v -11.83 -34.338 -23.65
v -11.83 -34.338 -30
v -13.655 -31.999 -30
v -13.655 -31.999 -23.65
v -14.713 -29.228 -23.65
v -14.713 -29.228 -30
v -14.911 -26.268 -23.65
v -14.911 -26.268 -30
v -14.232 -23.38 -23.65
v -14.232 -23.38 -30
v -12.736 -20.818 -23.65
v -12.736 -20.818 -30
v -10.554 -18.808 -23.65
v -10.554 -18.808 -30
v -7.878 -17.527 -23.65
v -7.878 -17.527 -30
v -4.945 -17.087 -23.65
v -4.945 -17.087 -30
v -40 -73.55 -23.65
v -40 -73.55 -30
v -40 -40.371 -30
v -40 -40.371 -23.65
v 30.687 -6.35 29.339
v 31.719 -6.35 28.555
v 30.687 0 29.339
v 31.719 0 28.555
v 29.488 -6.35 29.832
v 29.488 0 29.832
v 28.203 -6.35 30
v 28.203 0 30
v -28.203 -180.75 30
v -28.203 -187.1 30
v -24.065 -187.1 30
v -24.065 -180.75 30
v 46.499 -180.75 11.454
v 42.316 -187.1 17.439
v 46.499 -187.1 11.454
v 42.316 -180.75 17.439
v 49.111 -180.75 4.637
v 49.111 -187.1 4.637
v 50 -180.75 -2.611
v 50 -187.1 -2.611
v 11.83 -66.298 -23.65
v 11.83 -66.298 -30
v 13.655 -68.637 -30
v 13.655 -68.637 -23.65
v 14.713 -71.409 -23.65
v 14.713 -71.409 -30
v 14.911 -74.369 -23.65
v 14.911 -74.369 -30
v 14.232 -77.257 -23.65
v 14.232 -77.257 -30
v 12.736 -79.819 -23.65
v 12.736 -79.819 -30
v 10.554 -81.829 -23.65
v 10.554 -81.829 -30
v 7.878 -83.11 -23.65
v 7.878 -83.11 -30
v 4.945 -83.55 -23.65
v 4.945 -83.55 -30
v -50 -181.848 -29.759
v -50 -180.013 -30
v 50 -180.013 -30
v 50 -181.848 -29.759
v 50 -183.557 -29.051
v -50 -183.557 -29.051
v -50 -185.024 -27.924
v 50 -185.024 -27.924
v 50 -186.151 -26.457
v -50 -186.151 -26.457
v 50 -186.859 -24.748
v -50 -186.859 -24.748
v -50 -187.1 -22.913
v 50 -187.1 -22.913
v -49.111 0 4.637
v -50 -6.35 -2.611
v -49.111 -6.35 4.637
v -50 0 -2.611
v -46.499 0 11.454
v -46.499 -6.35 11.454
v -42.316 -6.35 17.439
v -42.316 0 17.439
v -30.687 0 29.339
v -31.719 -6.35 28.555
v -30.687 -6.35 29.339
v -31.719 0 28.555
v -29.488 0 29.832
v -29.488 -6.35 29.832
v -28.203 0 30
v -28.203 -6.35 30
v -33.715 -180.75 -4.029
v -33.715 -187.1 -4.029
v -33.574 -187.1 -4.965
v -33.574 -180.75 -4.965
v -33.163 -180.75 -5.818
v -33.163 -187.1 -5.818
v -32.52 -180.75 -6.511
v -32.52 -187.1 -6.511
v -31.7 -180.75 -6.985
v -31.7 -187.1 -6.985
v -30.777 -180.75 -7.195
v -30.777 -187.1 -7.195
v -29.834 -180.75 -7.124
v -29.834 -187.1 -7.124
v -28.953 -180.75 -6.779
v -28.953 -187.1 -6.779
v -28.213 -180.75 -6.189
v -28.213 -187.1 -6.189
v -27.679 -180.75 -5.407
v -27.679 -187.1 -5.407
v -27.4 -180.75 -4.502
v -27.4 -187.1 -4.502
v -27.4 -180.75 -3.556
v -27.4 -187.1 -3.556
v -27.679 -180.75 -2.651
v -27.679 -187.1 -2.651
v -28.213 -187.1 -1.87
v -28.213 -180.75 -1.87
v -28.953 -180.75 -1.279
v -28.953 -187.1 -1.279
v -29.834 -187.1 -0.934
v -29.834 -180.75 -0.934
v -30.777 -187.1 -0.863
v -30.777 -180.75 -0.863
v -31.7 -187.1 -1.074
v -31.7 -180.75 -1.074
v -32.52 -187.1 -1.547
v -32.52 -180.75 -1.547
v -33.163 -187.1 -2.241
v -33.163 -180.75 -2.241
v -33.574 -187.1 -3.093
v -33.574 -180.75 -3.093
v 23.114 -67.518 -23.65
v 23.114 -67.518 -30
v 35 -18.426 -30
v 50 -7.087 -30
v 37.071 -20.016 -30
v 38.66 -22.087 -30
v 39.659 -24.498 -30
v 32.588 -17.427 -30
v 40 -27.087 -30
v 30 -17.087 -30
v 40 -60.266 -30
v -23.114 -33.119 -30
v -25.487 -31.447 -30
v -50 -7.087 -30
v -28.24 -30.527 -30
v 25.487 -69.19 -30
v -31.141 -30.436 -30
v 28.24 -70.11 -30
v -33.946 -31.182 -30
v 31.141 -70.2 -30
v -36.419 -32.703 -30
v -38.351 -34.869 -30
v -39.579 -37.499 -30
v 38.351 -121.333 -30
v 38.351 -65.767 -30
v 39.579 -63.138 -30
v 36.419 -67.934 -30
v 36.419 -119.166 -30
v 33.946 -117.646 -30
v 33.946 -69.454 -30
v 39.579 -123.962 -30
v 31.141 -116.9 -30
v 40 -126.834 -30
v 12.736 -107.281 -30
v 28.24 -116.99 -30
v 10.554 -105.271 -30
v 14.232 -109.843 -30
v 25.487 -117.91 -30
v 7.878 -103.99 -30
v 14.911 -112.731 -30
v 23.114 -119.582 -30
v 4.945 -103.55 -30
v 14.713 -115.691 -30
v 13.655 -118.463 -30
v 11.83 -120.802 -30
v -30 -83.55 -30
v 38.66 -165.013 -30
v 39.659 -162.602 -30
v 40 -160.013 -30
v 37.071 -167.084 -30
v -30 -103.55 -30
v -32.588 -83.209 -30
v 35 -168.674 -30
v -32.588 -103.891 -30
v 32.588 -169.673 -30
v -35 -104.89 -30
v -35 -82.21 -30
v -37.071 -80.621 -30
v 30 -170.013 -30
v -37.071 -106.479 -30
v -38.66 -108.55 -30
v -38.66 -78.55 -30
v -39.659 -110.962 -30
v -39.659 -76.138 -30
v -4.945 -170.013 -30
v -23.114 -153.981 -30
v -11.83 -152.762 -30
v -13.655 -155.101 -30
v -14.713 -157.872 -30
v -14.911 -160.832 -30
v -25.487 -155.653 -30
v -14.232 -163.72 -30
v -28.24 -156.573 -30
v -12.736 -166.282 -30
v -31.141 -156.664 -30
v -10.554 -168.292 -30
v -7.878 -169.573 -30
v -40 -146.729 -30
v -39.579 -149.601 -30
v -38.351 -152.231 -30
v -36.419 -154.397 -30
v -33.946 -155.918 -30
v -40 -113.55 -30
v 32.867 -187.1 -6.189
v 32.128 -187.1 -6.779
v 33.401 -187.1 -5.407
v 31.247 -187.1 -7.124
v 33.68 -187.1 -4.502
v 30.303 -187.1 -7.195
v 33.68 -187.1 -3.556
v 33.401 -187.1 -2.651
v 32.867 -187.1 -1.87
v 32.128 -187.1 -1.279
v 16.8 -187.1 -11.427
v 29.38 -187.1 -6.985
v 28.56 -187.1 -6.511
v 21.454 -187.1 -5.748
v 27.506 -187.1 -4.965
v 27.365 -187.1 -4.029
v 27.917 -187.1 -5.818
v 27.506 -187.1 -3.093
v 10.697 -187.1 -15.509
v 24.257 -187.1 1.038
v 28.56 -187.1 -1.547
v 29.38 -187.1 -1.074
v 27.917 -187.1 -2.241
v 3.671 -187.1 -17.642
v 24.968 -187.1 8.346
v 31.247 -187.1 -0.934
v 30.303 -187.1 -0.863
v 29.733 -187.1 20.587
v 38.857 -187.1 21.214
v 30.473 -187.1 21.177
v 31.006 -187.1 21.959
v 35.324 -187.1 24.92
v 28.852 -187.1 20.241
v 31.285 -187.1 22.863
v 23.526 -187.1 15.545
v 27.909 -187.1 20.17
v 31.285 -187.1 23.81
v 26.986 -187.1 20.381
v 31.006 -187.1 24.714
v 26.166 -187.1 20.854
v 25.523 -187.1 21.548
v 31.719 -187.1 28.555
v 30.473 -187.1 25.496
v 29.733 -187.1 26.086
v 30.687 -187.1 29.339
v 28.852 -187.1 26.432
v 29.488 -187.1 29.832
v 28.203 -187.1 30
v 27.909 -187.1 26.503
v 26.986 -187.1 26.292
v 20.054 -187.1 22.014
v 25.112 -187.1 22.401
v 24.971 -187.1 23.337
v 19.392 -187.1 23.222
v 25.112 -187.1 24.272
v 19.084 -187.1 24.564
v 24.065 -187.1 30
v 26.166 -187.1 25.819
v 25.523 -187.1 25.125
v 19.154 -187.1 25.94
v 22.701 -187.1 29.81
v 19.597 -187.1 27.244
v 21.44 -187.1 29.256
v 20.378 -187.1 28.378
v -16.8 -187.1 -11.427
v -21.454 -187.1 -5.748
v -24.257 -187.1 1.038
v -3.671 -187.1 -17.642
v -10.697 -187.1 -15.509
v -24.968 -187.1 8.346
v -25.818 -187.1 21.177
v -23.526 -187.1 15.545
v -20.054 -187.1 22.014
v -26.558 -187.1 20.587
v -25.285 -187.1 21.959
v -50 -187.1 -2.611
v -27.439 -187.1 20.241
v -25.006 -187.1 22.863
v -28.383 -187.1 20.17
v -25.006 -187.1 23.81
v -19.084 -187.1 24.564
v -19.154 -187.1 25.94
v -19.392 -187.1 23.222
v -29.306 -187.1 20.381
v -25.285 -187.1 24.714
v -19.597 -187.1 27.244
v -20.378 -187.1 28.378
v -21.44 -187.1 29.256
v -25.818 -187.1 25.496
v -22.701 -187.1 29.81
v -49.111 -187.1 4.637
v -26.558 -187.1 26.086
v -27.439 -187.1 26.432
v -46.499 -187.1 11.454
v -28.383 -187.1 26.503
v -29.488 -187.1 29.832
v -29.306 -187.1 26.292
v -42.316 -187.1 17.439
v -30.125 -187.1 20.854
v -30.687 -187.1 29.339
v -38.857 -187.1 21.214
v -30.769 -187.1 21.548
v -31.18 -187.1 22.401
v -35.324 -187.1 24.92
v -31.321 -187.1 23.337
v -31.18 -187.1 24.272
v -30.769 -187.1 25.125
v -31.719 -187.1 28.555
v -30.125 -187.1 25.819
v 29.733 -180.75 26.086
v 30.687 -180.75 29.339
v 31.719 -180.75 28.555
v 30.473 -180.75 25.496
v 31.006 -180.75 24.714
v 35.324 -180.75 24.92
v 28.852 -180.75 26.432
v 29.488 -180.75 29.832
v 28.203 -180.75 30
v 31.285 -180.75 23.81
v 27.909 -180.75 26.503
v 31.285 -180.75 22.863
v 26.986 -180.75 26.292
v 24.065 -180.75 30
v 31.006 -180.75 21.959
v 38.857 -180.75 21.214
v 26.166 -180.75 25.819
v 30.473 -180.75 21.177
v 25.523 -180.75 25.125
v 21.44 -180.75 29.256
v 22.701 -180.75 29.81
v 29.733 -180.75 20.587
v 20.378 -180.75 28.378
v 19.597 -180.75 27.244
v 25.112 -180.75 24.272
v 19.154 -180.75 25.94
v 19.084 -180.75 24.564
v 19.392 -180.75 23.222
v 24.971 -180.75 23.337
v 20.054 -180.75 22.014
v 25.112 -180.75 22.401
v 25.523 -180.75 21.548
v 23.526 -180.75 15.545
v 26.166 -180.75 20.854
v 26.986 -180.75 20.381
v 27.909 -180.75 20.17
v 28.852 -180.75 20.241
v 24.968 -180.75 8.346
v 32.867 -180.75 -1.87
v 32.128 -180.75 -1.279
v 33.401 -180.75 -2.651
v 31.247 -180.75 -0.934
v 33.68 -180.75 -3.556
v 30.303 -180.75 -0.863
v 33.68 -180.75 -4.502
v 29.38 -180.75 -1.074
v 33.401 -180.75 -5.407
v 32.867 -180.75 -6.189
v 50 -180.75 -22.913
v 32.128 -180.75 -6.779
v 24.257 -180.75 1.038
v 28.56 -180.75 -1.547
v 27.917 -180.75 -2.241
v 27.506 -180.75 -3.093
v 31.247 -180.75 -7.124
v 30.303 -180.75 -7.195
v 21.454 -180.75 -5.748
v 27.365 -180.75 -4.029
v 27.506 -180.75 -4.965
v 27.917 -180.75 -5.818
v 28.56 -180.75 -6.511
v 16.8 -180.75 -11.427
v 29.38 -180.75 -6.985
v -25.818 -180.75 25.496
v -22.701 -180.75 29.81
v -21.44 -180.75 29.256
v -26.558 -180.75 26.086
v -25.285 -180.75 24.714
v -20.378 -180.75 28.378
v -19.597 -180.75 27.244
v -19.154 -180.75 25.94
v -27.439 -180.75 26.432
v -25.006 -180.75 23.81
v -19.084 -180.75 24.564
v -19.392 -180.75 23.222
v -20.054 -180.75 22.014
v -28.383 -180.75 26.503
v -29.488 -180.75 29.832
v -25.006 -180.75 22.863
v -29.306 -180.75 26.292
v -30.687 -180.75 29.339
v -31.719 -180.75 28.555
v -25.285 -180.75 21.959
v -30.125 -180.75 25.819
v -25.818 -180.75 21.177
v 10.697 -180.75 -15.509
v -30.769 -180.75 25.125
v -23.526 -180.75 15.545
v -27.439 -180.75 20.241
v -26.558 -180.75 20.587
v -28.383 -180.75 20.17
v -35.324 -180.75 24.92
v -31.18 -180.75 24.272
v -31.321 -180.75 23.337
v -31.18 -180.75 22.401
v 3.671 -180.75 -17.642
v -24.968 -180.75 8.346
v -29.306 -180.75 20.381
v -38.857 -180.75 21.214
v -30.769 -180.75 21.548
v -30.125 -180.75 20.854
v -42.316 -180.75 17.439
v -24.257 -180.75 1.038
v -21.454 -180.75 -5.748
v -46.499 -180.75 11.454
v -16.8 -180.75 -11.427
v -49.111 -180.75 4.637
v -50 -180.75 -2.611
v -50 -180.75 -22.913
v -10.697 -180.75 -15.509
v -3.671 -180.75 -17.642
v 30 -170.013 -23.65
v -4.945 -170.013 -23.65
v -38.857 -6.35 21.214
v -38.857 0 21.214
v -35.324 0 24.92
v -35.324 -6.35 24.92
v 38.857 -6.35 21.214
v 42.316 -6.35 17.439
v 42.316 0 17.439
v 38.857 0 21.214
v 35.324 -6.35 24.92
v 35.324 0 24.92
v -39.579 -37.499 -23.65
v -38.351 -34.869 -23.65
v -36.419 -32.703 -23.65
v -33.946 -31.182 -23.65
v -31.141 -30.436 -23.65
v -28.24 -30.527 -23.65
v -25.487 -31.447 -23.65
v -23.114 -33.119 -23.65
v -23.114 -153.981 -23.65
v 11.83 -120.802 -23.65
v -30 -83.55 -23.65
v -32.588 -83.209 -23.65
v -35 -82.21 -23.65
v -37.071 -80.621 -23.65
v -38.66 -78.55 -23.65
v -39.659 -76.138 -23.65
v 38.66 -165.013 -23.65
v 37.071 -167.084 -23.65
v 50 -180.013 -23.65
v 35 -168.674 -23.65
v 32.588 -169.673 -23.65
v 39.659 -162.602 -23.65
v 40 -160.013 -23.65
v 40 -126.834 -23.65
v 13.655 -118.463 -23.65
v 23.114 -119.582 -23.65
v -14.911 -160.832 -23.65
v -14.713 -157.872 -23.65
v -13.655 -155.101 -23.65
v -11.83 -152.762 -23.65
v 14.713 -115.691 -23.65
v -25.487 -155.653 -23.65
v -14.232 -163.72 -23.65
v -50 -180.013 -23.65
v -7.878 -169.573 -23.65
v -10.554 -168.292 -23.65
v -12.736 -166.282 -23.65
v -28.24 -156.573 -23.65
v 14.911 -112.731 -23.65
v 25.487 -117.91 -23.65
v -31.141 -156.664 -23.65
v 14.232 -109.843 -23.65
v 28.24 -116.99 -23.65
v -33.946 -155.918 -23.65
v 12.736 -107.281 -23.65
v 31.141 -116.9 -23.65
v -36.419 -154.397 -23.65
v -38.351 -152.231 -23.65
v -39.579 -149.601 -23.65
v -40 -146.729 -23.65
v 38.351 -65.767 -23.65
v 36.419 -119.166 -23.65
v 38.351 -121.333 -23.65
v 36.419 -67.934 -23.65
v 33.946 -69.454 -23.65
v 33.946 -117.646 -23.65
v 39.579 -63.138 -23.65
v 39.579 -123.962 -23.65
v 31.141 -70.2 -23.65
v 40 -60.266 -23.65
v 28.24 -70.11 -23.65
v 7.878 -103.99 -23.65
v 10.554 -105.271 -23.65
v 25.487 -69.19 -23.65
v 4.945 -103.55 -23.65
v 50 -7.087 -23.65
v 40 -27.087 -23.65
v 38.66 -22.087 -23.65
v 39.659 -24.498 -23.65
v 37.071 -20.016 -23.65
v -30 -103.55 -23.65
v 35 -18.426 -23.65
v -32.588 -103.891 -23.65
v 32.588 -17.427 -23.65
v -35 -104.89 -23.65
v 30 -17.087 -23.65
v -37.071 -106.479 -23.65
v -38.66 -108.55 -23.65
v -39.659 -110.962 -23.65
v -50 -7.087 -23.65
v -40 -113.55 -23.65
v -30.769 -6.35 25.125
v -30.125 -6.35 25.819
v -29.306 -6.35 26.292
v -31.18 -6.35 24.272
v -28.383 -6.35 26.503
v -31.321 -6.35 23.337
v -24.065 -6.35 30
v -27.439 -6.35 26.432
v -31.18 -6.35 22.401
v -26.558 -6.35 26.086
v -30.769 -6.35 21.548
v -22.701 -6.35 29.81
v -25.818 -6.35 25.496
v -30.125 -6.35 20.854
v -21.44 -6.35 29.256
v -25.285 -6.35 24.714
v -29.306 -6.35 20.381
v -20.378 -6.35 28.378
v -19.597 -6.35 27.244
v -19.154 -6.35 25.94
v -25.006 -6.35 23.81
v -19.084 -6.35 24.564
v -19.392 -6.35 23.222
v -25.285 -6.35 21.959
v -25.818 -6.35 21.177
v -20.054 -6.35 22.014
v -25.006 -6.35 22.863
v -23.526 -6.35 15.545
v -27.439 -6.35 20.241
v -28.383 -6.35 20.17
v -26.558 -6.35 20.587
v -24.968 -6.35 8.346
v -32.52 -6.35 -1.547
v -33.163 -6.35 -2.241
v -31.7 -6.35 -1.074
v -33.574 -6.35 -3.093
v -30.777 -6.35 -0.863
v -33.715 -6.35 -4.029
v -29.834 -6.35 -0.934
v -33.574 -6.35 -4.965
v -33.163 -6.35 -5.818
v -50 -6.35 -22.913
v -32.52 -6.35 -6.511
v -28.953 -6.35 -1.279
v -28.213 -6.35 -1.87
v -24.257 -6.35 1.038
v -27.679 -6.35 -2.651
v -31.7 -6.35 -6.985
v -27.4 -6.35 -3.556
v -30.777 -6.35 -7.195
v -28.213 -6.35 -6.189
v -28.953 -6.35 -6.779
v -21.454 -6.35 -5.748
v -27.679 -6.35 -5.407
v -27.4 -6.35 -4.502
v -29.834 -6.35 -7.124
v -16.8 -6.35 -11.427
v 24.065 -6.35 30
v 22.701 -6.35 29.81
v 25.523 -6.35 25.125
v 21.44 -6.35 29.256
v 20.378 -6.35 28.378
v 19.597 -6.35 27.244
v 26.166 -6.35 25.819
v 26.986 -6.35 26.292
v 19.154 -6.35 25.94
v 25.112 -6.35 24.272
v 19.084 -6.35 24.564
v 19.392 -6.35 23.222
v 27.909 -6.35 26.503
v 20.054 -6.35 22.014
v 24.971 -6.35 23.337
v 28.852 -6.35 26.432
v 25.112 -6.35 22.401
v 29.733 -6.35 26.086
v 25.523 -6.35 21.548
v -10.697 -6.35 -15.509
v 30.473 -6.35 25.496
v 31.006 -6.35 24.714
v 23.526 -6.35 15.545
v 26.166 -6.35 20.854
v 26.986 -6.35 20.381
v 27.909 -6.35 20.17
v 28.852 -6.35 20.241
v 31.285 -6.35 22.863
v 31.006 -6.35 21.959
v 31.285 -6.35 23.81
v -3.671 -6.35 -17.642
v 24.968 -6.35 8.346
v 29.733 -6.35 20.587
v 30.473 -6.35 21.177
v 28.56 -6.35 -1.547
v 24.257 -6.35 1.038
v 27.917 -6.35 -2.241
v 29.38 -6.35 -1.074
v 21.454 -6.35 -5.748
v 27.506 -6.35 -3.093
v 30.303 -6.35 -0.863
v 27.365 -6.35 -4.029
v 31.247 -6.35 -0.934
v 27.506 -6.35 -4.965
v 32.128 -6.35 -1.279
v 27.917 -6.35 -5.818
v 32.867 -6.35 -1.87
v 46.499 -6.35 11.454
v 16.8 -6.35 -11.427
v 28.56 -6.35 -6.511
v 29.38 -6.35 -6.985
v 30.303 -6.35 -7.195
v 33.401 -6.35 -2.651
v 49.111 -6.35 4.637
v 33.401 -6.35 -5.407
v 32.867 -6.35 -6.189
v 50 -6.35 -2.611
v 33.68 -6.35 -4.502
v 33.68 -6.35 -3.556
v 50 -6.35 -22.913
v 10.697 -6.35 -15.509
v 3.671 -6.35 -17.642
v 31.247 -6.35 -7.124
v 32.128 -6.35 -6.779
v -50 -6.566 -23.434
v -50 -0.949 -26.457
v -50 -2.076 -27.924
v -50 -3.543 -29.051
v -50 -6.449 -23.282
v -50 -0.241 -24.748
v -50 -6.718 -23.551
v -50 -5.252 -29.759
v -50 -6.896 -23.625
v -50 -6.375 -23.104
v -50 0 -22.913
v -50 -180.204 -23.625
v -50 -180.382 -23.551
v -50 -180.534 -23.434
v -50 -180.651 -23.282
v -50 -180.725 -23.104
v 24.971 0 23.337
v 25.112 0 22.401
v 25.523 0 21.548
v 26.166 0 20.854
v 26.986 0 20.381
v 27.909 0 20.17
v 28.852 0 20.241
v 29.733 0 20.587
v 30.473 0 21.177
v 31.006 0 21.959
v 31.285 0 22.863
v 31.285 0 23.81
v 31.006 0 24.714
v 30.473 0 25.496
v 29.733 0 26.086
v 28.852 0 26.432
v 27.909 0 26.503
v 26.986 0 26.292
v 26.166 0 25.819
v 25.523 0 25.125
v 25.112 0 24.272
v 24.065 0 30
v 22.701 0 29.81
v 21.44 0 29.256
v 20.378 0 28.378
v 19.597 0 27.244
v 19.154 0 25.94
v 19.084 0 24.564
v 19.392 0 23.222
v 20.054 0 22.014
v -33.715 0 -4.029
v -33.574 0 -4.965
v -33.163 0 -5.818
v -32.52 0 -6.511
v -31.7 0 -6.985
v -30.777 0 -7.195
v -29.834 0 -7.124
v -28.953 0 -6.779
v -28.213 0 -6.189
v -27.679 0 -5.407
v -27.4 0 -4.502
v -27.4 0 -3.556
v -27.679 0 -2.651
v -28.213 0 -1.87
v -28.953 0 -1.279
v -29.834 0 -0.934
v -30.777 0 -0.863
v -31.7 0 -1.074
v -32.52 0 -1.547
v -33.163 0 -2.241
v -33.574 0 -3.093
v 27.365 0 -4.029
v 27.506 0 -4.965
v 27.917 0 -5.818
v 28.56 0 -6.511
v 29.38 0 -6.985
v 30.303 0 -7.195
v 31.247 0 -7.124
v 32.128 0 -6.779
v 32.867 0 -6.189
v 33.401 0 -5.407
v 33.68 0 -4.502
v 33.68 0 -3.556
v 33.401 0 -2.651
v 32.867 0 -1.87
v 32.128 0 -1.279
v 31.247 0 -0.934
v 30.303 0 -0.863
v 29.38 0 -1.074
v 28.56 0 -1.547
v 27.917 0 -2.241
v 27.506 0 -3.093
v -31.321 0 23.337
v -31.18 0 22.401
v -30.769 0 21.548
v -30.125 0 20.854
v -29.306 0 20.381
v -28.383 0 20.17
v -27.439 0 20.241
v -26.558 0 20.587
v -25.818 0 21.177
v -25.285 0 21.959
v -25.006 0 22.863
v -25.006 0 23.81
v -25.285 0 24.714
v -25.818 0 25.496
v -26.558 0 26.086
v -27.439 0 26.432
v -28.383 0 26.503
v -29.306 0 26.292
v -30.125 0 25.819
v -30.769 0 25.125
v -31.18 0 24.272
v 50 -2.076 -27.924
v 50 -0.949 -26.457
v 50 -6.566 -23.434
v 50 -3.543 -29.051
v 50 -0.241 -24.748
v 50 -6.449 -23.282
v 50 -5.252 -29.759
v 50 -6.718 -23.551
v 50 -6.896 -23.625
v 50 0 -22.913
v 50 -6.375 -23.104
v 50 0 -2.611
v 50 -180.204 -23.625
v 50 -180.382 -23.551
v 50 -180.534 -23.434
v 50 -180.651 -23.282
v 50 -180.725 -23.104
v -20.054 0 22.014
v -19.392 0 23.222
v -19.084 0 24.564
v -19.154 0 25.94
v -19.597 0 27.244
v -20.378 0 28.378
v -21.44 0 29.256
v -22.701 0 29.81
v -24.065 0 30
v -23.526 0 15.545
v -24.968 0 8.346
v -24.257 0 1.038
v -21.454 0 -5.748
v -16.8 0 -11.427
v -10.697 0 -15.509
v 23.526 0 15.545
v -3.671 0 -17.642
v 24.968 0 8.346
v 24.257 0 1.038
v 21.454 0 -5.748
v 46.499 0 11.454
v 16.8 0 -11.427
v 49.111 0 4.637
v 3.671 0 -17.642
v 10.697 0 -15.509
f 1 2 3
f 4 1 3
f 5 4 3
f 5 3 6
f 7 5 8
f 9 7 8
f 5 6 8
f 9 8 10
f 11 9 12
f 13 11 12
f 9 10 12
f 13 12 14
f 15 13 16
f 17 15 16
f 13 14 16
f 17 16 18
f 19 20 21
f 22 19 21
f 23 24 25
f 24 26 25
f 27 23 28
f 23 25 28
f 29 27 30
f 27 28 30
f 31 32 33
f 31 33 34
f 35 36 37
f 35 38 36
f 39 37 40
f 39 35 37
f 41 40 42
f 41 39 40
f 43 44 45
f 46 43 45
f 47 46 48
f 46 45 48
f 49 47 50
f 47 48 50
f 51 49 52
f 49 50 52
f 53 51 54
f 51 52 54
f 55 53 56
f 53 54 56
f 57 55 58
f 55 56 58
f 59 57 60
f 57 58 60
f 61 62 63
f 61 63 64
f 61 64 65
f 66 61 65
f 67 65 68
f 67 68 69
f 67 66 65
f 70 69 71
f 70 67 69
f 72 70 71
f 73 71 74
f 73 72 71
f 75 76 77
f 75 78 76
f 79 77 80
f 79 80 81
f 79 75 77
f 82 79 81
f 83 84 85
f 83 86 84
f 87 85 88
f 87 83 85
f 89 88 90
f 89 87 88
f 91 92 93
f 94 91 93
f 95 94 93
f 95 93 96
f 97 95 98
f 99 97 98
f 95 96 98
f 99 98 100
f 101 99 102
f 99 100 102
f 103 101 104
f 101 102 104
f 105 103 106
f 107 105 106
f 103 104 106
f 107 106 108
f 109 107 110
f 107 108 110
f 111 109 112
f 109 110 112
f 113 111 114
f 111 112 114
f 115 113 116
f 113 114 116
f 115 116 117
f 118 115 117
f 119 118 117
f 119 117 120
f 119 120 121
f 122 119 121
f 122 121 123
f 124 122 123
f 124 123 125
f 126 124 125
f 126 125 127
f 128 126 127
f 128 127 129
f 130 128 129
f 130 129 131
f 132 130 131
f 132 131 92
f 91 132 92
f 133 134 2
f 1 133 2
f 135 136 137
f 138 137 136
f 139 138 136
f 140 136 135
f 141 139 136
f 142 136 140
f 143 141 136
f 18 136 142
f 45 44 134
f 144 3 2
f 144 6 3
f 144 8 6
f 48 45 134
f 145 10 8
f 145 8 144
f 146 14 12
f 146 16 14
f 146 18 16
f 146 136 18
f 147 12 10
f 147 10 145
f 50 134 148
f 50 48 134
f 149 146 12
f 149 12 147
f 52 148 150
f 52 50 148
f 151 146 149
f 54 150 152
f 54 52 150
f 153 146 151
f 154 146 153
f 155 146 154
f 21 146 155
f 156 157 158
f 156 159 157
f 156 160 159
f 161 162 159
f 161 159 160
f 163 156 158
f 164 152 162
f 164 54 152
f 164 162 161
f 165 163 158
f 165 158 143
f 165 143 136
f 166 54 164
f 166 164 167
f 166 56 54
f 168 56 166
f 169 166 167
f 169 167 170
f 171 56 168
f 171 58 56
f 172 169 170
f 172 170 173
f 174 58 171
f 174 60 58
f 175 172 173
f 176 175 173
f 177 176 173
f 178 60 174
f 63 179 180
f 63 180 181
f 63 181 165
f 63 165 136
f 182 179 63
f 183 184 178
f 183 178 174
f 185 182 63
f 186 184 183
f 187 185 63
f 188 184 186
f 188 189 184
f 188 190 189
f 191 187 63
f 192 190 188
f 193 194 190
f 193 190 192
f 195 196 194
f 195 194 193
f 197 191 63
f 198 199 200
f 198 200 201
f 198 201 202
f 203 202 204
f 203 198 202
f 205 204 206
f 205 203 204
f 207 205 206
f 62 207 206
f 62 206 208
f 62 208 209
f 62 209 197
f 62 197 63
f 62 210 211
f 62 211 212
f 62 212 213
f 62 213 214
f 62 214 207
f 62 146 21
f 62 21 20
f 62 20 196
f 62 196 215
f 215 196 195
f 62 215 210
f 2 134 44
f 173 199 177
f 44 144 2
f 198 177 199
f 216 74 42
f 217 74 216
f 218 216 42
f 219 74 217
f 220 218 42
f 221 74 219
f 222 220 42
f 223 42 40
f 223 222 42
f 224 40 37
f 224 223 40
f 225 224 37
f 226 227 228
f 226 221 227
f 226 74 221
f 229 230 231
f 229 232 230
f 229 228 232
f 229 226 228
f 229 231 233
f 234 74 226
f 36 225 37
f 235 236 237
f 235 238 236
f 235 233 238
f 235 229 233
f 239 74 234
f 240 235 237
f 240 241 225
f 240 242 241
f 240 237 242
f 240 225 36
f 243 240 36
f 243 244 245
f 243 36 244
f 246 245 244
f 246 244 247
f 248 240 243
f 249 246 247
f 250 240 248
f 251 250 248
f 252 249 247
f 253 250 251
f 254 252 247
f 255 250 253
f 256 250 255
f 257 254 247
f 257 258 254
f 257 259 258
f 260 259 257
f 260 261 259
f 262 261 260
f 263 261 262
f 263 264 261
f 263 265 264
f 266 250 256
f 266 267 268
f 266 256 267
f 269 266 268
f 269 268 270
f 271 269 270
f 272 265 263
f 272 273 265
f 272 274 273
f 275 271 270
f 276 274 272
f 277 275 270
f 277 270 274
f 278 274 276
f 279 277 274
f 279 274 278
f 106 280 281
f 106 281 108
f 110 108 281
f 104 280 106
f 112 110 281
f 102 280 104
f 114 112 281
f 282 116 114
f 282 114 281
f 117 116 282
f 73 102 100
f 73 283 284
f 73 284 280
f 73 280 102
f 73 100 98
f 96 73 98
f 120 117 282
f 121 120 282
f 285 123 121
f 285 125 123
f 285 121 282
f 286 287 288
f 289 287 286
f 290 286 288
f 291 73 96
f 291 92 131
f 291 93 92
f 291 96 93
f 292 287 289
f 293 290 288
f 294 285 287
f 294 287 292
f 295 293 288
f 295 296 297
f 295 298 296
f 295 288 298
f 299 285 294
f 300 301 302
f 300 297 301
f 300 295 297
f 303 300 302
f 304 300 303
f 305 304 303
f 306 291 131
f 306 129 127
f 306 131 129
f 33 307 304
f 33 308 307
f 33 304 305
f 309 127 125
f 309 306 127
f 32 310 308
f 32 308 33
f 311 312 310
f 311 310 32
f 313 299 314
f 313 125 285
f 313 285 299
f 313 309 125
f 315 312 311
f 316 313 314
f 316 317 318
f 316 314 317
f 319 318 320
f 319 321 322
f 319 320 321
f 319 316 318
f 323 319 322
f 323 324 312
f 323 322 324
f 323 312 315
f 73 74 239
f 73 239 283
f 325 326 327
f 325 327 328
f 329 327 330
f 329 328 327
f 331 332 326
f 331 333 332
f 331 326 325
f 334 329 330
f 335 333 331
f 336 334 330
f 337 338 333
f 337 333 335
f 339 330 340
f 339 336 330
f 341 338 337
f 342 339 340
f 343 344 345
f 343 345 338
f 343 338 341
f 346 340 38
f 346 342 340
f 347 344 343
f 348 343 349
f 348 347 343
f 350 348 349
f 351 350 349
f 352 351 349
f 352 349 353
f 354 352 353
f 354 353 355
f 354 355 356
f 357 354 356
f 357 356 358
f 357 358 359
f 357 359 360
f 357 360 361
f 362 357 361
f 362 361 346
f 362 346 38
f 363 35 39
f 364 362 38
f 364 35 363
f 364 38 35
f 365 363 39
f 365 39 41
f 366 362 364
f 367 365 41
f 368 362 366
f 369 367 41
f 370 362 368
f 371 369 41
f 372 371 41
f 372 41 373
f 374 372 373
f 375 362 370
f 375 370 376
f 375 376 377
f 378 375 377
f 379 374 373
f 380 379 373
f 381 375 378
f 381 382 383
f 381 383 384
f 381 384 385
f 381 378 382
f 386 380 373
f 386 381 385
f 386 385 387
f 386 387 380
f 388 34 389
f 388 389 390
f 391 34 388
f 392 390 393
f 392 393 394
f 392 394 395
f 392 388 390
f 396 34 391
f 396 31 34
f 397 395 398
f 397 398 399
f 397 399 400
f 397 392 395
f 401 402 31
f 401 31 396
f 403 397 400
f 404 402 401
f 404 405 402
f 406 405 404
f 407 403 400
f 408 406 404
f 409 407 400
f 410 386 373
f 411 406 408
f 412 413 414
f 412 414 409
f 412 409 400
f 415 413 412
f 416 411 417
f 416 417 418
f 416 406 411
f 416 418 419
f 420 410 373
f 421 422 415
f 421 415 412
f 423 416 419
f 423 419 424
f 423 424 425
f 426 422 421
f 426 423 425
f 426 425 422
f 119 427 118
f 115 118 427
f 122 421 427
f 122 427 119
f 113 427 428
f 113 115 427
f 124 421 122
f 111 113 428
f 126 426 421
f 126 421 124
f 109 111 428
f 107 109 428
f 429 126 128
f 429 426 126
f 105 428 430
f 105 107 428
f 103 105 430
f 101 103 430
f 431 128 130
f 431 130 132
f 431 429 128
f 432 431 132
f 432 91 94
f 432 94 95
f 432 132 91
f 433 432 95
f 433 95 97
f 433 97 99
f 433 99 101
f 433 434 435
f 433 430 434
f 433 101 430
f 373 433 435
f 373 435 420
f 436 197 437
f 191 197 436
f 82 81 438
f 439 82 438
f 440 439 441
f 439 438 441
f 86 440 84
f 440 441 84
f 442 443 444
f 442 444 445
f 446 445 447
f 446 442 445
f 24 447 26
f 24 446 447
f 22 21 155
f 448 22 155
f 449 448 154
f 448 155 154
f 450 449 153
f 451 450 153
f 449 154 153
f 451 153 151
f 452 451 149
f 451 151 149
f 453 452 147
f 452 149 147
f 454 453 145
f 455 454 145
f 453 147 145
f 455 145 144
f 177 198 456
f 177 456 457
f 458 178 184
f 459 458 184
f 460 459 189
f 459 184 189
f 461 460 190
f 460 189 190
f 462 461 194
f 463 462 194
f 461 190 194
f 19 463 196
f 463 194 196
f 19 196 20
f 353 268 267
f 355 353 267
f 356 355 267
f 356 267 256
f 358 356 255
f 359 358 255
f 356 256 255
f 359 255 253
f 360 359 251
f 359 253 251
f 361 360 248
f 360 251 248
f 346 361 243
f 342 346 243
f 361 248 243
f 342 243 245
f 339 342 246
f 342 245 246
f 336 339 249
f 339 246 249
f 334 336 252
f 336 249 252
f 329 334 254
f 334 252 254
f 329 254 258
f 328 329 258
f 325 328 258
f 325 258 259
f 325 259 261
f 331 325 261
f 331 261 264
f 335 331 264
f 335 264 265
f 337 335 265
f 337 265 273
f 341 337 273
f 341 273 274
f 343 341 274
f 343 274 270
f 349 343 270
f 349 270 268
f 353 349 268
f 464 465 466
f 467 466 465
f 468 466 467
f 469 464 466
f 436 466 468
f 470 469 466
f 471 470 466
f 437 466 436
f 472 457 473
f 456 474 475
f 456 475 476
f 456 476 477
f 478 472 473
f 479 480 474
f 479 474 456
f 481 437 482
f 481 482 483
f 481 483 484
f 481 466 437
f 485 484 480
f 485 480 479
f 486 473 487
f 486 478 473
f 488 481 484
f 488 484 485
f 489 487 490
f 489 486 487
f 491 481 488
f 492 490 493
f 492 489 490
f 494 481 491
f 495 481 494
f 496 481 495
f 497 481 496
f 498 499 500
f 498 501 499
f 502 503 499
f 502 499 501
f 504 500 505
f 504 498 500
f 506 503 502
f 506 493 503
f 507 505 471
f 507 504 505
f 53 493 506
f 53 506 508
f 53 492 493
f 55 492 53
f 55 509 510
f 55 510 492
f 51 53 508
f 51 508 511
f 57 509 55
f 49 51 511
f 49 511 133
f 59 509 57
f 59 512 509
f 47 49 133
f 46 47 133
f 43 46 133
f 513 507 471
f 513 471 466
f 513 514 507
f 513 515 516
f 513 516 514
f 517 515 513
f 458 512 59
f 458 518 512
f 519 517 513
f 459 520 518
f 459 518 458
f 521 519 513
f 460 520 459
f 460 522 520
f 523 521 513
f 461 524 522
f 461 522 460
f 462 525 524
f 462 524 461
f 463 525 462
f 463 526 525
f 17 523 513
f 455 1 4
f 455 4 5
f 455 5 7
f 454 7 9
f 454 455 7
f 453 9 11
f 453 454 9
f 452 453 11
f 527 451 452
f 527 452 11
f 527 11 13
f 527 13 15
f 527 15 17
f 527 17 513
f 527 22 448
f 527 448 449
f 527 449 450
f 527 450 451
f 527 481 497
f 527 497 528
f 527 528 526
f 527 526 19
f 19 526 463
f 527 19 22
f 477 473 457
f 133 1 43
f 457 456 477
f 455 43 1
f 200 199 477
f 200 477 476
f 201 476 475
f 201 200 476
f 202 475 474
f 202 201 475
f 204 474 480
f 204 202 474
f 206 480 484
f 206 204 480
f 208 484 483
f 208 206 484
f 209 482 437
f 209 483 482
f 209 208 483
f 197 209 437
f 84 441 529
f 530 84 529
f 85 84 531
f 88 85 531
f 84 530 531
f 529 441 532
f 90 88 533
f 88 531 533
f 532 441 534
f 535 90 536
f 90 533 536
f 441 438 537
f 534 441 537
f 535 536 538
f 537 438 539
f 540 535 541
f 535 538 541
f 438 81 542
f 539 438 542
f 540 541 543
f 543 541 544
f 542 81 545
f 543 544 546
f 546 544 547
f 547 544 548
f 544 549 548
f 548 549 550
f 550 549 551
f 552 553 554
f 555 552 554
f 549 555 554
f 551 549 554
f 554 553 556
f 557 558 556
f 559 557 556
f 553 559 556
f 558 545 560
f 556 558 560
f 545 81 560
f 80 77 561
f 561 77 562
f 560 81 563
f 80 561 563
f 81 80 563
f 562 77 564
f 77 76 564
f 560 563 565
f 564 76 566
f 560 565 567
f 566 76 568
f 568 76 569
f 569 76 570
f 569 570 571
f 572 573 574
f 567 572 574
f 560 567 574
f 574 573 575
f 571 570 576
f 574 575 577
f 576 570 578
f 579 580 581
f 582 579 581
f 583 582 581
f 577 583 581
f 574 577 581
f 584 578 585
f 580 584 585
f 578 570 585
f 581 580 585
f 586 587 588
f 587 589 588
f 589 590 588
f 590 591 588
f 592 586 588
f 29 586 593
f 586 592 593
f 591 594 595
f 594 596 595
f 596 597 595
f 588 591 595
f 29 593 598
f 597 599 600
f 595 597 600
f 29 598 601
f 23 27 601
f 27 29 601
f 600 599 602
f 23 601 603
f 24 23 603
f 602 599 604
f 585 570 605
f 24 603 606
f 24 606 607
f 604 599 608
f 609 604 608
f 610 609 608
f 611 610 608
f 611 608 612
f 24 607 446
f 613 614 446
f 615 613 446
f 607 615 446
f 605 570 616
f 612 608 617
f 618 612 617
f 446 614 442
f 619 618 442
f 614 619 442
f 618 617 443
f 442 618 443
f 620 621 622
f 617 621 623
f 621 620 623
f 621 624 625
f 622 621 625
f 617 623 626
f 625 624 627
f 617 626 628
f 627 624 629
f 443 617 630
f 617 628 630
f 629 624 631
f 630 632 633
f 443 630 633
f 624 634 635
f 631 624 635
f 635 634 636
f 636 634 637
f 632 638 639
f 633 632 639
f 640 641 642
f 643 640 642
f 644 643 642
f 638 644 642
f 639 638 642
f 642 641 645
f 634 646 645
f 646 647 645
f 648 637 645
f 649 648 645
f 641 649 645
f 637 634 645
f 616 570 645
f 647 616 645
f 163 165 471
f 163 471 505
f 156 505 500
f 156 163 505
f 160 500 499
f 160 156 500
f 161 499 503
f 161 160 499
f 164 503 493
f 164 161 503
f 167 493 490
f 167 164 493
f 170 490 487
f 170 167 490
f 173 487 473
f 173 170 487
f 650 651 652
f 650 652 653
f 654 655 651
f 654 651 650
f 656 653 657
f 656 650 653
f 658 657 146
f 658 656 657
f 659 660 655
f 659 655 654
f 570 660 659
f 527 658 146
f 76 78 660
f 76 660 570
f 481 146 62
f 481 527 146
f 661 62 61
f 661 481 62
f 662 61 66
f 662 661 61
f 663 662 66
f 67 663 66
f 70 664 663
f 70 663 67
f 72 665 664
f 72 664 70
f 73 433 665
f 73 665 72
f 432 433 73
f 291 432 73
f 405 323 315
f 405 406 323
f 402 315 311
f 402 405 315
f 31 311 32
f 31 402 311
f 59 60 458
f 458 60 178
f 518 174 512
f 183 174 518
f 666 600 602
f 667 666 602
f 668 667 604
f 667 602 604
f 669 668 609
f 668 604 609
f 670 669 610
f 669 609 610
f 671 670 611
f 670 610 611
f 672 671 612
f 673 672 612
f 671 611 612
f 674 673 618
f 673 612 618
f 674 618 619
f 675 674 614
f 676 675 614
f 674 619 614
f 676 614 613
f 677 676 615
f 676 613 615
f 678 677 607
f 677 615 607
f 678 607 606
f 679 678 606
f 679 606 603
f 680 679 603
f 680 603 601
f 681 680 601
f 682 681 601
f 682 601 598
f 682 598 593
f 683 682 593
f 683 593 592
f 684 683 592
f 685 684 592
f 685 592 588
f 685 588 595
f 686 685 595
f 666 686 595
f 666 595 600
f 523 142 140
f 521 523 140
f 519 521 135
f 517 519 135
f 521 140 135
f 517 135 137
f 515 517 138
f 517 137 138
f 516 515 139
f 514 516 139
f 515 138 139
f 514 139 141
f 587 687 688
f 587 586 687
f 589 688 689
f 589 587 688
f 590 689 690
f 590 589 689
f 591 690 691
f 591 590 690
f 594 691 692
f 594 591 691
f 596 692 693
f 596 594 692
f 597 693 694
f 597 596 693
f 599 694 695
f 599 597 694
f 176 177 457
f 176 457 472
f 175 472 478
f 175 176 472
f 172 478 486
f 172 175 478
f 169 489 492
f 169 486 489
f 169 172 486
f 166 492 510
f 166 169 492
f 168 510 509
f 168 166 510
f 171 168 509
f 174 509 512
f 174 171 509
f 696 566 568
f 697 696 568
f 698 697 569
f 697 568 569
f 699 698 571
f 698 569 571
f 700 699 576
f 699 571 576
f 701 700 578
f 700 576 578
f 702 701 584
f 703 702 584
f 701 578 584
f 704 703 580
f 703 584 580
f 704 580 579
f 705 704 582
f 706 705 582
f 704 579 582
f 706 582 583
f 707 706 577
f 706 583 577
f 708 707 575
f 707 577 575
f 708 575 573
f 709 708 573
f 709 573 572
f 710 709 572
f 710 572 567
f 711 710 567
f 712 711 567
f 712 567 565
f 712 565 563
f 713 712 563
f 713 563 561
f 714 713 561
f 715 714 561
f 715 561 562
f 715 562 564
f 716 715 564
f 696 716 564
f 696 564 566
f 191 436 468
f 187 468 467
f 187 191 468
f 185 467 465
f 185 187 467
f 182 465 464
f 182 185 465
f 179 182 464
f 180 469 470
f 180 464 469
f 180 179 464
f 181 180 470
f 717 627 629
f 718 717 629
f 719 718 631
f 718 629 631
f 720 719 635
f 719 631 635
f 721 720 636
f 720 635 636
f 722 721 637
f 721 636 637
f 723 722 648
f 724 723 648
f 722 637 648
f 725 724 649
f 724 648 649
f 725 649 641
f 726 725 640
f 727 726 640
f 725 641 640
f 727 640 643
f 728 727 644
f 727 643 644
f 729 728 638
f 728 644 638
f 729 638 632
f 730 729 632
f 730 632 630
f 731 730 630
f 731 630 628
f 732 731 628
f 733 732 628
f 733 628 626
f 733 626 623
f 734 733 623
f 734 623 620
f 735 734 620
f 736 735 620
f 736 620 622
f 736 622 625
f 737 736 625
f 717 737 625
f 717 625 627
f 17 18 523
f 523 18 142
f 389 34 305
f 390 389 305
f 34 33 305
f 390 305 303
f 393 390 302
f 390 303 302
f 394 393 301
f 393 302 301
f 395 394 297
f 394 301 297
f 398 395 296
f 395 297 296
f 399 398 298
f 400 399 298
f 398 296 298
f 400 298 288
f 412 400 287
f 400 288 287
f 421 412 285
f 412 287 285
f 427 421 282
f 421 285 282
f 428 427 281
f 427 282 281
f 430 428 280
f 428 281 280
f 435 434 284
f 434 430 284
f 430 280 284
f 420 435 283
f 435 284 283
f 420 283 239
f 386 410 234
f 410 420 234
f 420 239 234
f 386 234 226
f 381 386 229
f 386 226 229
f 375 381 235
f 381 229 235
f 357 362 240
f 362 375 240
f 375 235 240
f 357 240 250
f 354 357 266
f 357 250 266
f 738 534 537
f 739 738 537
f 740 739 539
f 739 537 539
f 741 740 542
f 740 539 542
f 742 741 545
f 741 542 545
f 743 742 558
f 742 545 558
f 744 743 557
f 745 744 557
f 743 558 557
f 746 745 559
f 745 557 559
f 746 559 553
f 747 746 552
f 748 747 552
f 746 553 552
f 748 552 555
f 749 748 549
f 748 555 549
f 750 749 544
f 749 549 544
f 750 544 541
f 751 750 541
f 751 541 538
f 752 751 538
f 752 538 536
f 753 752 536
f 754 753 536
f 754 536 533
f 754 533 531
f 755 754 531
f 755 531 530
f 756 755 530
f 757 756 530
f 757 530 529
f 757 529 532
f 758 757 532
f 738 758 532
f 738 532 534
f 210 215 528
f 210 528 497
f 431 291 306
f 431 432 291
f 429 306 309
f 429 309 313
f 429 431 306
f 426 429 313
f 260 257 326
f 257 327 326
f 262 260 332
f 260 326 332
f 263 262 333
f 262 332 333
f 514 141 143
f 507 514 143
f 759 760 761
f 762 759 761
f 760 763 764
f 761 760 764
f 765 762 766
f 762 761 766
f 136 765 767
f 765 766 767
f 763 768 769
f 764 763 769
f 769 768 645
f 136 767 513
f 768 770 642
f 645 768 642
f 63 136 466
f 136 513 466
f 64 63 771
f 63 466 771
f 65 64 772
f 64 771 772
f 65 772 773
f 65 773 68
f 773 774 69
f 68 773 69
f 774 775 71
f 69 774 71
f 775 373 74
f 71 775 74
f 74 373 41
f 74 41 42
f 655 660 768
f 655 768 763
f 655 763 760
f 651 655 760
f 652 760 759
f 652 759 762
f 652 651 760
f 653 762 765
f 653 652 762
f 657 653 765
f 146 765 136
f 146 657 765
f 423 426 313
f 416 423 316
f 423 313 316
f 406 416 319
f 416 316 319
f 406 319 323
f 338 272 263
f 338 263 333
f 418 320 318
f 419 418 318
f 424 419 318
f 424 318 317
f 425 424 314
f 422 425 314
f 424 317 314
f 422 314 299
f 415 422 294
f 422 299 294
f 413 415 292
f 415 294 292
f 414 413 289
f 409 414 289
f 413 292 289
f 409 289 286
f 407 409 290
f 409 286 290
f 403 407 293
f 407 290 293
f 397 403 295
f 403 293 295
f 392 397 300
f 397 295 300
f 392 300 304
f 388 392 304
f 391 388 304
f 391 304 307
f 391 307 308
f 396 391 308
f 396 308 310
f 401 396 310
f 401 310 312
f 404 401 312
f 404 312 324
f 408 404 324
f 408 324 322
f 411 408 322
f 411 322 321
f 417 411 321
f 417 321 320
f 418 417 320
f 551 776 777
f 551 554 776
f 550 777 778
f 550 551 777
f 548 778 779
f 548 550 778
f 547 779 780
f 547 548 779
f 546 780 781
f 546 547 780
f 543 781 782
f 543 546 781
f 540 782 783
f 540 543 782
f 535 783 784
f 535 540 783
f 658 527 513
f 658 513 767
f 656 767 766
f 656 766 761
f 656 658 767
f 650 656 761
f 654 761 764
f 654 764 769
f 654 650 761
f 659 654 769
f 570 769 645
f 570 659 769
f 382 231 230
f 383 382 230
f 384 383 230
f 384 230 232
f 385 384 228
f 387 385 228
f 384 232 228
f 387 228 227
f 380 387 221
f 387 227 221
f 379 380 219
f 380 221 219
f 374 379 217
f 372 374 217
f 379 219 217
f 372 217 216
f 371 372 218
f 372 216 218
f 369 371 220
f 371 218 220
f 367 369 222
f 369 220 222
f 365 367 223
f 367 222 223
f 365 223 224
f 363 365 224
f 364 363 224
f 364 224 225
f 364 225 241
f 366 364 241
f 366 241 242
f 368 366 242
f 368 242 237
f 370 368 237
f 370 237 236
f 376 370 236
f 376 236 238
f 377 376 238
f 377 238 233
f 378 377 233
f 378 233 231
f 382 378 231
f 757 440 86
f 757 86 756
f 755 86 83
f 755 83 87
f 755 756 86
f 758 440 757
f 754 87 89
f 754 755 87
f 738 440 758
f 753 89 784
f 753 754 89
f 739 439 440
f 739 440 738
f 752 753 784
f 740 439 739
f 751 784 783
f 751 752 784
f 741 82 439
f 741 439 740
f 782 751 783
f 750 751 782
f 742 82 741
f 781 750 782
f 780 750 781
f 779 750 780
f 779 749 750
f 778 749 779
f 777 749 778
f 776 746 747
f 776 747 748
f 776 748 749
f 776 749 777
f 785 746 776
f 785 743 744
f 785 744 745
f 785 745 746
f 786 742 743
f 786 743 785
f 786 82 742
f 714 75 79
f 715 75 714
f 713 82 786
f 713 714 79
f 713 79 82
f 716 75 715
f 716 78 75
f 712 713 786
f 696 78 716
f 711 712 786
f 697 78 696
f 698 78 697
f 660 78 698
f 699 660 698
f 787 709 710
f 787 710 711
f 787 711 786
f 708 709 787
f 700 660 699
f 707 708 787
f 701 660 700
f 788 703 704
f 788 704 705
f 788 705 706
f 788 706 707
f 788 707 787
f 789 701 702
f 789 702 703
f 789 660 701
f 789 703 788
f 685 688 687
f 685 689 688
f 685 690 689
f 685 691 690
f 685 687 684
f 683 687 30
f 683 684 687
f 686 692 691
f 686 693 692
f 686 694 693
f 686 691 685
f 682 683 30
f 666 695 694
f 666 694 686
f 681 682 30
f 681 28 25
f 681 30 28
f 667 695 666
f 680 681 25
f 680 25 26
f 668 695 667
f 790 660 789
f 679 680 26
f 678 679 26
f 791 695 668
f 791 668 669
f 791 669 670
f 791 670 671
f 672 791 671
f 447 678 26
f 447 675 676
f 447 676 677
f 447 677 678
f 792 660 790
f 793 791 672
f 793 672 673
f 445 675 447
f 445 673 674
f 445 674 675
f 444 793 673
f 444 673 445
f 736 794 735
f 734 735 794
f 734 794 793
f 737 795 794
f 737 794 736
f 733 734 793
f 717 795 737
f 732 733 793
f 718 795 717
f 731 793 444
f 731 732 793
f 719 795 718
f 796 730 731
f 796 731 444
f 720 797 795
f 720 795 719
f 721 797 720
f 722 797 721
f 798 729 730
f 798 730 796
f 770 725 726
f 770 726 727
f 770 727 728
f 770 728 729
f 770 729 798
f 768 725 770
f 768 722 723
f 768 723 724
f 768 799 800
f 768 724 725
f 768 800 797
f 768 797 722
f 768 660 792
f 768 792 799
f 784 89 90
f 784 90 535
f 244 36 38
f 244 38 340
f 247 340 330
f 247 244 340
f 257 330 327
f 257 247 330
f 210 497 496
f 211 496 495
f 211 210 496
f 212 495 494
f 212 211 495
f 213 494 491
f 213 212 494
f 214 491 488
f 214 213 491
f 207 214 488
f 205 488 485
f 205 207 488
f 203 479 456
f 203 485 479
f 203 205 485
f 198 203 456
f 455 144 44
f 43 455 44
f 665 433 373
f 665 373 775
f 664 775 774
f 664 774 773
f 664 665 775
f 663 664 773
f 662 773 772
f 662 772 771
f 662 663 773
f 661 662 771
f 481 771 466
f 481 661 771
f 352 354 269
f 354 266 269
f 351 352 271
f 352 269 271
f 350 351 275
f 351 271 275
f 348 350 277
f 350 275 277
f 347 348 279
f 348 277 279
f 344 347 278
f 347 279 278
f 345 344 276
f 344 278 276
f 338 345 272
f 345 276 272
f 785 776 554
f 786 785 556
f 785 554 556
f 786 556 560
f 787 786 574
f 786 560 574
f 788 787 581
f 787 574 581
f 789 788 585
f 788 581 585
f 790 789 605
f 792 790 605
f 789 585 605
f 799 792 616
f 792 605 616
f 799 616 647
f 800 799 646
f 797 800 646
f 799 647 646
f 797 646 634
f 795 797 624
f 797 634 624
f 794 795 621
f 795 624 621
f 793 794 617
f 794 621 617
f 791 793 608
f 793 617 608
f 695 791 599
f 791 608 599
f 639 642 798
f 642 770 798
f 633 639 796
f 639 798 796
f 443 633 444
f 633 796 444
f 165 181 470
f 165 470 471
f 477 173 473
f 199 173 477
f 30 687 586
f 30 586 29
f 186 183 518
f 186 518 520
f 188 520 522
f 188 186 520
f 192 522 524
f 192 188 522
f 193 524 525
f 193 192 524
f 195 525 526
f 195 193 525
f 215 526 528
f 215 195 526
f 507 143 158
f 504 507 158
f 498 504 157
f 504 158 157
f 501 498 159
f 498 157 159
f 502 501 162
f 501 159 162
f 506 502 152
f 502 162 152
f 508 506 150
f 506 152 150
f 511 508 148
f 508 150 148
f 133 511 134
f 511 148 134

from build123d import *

# Parameters (mm, degrees)
SKETCH1_W                    = 100
SKETCH1_H                    = 60
BASE_FLANGE1_DEPTH           = 6.35
EDGE_FLANGE2_STRIP_W         = 26.8732
EDGE_FLANGE2_STRIP_H         = 6.35
EDGE_FLANGE2_STRIP_CUT_DEPTH = 100
EDGE_FLANGE2_DEPTH           = 100
EDGE_FLANGE3_STRIP_W         = 26.8732
EDGE_FLANGE3_STRIP_H         = 6.35
EDGE_FLANGE3_STRIP_CUT_DEPTH = 100
EDGE_FLANGE3_DEPTH           = 100
SKETCH27_R                   = 25
CUT_EXTRUDE2_DEPTH           = 196.975534187
FILLET3_R                    = 5
F_1_4_0_25_DIAMETER_HOLE1_D  = 6.35
CUT_EXTRUDE3_DEPTH           = 203.74715781
CUT_EXTRUDE4_DEPTH           = 196.975534187
FILLET4_R                    = 30
FILLET5_R                    = 5


# Sheet-metal steps are written as plain solids
with BuildPart() as part:
    # Sketch1 → Base-Flange1 (new body)
    with BuildSketch(Plane(origin=(0, 0, 0), x_dir=(1, 0, 0), z_dir=(0, 1, 0))):
        Rectangle(SKETCH1_W, SKETCH1_H)
    extrude(amount=-BASE_FLANGE1_DEPTH)

    # Edge-Flange2 strip (across the edge) → Edge-Flange2 strip cut (cut)
    with BuildSketch(Plane(origin=(-50, -6.35, -30), x_dir=(0, 0, 1), z_dir=(1, 0, 0))):
        with Locations((-6.35, -3.175)):
            Rectangle(EDGE_FLANGE2_STRIP_W, EDGE_FLANGE2_STRIP_H)
    extrude(amount=EDGE_FLANGE2_STRIP_CUT_DEPTH, mode=Mode.SUBTRACT)

    # Edge-Flange2 section (across the edge) → Edge-Flange2 (add)
    with BuildSketch(Plane(origin=(-50, -6.35, -30), x_dir=(0, 0, 1), z_dir=(1, 0, 0))):
        with BuildLine():
            Line((0, 0.7366), (0, 180.75))
            Line((0, 180.75), (6.35, 180.75))
            Line((6.35, 180.75), (6.35, 0.7366))
            ThreePointArc((6.35, 0.7366), (6.565745145, 0.215745145), (7.0866, 0))
            Line((7.0866, 0), (7.0866, -6.35))
            ThreePointArc((7.0866, -6.35), (2.075617084, -4.274382916), (0, 0.7366))
        make_face()
    extrude(amount=EDGE_FLANGE2_DEPTH)

    # Edge-Flange3 strip (across the edge) → Edge-Flange3 strip cut (cut)
    with BuildSketch(Plane(origin=(-50, -187.1, -23.65), x_dir=(0, 1, 0), z_dir=(1, 0, 0))):
        with Locations((-6.35, -3.175)):
            Rectangle(EDGE_FLANGE3_STRIP_W, EDGE_FLANGE3_STRIP_H)
    extrude(amount=EDGE_FLANGE3_STRIP_CUT_DEPTH, mode=Mode.SUBTRACT)

    # Edge-Flange3 section (across the edge) → Edge-Flange3 (add)
    with BuildSketch(Plane(origin=(-50, -187.1, -23.65), x_dir=(0, 1, 0), z_dir=(1, 0, 0))):
        with BuildLine():
            Line((0, 0.7366), (0, 53.65))
            Line((0, 53.65), (6.35, 53.65))
            Line((6.35, 53.65), (6.35, 0.7366))
            ThreePointArc((6.35, 0.7366), (6.565745145, 0.215745145), (7.0866, 0))
            Line((7.0866, 0), (7.0866, -6.35))
            ThreePointArc((7.0866, -6.35), (2.075617084, -4.274382916), (0, 0.7366))
        make_face()
    extrude(amount=EDGE_FLANGE3_DEPTH)

    # Sketch27 → Cut-Extrude2 (cut, through all)
    with BuildSketch(Plane.XZ.offset(187.1)):
        with Locations((0, 7.0866)):
            Circle(SKETCH27_R)
    extrude(amount=-CUT_EXTRUDE2_DEPTH, mode=Mode.SUBTRACT)

    # Fillet3
    fillet3_edges = [part.edges().sort_by_distance(p)[0] for p in [
        (-50, -183.925, 30),
        (50, -183.925, 30),
        (50, -3.175, 30),
        (-50, -3.175, 30),
        (9.998804951, -183.925, 30),
        (-9.998804951, -183.925, 30),
        (-9.998804951, -3.175, 30),
        (9.998804951, -3.175, 30),
    ]]
    fillet(fillet3_edges, radius=FILLET3_R)

    # 1/4 (0.25) Diameter Hole1 (through all)
    with Locations(Plane(origin=(0, 0, 0), x_dir=(1, 0, 0), z_dir=(0, 1, 0))):
        with Locations((28.145825623, -23.3366), (-30.540010176, 4.029054658), (30.540010176, 4.029054658), (-28.145825623, -23.3366)):
            Hole(F_1_4_0_25_DIAMETER_HOLE1_D / 2)

    # Sketch30 → Cut-Extrude3 (cut, through all)
    with BuildSketch(Plane(origin=(0, 0, -30), x_dir=(-1, 0, 0), z_dir=(0, 0, -1))):
        with BuildLine():
            Line((-40, -27.0866), (-40, -60.265715002))
            ThreePointArc((-40, -60.265715002), (-33.94619985, -69.454159198), (-23.114498651, -67.517602423))
            Line((-23.114498651, -67.517602423), (11.830118238, -34.338487421))
            ThreePointArc((11.830118238, -34.338487421), (14.232212762, -23.379773474), (4.944616889, -17.0866))
            Line((4.944616889, -17.0866), (-30, -17.0866))
            ThreePointArc((-30, -17.0866), (-37.071067812, -20.015532188), (-40, -27.0866))
        make_face()
        with BuildLine():
            Line((23.114498651, -33.118997577), (-11.830118238, -66.298112579))
            ThreePointArc((-11.830118238, -66.298112579), (-14.232212762, -77.256826526), (-4.944616889, -83.55))
            Line((-4.944616889, -83.55), (30, -83.55))
            ThreePointArc((30, -83.55), (37.071067812, -80.621067812), (40, -73.55))
            Line((40, -73.55), (40, -40.370884998))
            ThreePointArc((40, -40.370884998), (33.94619985, -31.182440802), (23.114498651, -33.118997577))
        make_face()
        with BuildLine():
            Line((-23.114498651, -119.582397577), (11.830118238, -152.761512579))
            ThreePointArc((11.830118238, -152.761512579), (14.232212762, -163.720226526), (4.944616889, -170.0134))
            Line((4.944616889, -170.0134), (-30, -170.0134))
            ThreePointArc((-30, -170.0134), (-37.071067812, -167.084467812), (-40, -160.0134))
            Line((-40, -160.0134), (-40, -126.834284998))
            ThreePointArc((-40, -126.834284998), (-33.94619985, -117.645840802), (-23.114498651, -119.582397577))
        make_face()
        with BuildLine():
            Line((-4.944616889, -103.55), (30, -103.55))
            ThreePointArc((30, -103.55), (37.071067812, -106.478932188), (40, -113.55))
            Line((40, -113.55), (40, -146.729115002))
            ThreePointArc((40, -146.729115002), (33.94619985, -155.917559198), (23.114498651, -153.981002423))
            Line((23.114498651, -153.981002423), (-11.830118238, -120.801887421))
            ThreePointArc((-11.830118238, -120.801887421), (-14.232212762, -109.843173474), (-4.944616889, -103.55))
        make_face()
    extrude(amount=-CUT_EXTRUDE3_DEPTH, mode=Mode.SUBTRACT)

    # Sketch31 → Cut-Extrude4 (cut, through all)
    with BuildSketch(Plane.XZ.offset(187.1)):
        with BuildLine():
            Line((30.246393456, 30), (50, 30))
            Line((50, 30), (50, 8.486121202))
            ThreePointArc((50, 8.486121202), (40.425530077, 19.520656941), (30.246393456, 30))
        make_face()
        with BuildLine():
            Line((-30.246393456, 30), (-50, 30))
            Line((-50, 30), (-50, 8.486121202))
            ThreePointArc((-50, 8.486121202), (-40.425530077, 19.520656941), (-30.246393456, 30))
        make_face()
    extrude(amount=-CUT_EXTRUDE4_DEPTH, mode=Mode.SUBTRACT)

    # Fillet4
    fillet4_edges = [part.edges().sort_by_distance(p)[0] for p in [
        (50, -3.175, 8.486121202),
        (50, -183.925, 8.486121202),
        (-50, -3.175, 8.486121202),
        (-50, -183.925, 8.486121202),
    ]]
    fillet(fillet4_edges, radius=FILLET4_R)

    # Fillet5
    fillet5_edges = [part.edges().sort_by_distance(p)[0] for p in [
        (30.246393456, -3.175, 30),
        (30.246393456, -183.925, 30),
        (-30.246393456, -3.175, 30),
        (-30.246393456, -183.925, 30),
    ]]
    fillet(fillet5_edges, radius=FILLET5_R)


solid = part.part
